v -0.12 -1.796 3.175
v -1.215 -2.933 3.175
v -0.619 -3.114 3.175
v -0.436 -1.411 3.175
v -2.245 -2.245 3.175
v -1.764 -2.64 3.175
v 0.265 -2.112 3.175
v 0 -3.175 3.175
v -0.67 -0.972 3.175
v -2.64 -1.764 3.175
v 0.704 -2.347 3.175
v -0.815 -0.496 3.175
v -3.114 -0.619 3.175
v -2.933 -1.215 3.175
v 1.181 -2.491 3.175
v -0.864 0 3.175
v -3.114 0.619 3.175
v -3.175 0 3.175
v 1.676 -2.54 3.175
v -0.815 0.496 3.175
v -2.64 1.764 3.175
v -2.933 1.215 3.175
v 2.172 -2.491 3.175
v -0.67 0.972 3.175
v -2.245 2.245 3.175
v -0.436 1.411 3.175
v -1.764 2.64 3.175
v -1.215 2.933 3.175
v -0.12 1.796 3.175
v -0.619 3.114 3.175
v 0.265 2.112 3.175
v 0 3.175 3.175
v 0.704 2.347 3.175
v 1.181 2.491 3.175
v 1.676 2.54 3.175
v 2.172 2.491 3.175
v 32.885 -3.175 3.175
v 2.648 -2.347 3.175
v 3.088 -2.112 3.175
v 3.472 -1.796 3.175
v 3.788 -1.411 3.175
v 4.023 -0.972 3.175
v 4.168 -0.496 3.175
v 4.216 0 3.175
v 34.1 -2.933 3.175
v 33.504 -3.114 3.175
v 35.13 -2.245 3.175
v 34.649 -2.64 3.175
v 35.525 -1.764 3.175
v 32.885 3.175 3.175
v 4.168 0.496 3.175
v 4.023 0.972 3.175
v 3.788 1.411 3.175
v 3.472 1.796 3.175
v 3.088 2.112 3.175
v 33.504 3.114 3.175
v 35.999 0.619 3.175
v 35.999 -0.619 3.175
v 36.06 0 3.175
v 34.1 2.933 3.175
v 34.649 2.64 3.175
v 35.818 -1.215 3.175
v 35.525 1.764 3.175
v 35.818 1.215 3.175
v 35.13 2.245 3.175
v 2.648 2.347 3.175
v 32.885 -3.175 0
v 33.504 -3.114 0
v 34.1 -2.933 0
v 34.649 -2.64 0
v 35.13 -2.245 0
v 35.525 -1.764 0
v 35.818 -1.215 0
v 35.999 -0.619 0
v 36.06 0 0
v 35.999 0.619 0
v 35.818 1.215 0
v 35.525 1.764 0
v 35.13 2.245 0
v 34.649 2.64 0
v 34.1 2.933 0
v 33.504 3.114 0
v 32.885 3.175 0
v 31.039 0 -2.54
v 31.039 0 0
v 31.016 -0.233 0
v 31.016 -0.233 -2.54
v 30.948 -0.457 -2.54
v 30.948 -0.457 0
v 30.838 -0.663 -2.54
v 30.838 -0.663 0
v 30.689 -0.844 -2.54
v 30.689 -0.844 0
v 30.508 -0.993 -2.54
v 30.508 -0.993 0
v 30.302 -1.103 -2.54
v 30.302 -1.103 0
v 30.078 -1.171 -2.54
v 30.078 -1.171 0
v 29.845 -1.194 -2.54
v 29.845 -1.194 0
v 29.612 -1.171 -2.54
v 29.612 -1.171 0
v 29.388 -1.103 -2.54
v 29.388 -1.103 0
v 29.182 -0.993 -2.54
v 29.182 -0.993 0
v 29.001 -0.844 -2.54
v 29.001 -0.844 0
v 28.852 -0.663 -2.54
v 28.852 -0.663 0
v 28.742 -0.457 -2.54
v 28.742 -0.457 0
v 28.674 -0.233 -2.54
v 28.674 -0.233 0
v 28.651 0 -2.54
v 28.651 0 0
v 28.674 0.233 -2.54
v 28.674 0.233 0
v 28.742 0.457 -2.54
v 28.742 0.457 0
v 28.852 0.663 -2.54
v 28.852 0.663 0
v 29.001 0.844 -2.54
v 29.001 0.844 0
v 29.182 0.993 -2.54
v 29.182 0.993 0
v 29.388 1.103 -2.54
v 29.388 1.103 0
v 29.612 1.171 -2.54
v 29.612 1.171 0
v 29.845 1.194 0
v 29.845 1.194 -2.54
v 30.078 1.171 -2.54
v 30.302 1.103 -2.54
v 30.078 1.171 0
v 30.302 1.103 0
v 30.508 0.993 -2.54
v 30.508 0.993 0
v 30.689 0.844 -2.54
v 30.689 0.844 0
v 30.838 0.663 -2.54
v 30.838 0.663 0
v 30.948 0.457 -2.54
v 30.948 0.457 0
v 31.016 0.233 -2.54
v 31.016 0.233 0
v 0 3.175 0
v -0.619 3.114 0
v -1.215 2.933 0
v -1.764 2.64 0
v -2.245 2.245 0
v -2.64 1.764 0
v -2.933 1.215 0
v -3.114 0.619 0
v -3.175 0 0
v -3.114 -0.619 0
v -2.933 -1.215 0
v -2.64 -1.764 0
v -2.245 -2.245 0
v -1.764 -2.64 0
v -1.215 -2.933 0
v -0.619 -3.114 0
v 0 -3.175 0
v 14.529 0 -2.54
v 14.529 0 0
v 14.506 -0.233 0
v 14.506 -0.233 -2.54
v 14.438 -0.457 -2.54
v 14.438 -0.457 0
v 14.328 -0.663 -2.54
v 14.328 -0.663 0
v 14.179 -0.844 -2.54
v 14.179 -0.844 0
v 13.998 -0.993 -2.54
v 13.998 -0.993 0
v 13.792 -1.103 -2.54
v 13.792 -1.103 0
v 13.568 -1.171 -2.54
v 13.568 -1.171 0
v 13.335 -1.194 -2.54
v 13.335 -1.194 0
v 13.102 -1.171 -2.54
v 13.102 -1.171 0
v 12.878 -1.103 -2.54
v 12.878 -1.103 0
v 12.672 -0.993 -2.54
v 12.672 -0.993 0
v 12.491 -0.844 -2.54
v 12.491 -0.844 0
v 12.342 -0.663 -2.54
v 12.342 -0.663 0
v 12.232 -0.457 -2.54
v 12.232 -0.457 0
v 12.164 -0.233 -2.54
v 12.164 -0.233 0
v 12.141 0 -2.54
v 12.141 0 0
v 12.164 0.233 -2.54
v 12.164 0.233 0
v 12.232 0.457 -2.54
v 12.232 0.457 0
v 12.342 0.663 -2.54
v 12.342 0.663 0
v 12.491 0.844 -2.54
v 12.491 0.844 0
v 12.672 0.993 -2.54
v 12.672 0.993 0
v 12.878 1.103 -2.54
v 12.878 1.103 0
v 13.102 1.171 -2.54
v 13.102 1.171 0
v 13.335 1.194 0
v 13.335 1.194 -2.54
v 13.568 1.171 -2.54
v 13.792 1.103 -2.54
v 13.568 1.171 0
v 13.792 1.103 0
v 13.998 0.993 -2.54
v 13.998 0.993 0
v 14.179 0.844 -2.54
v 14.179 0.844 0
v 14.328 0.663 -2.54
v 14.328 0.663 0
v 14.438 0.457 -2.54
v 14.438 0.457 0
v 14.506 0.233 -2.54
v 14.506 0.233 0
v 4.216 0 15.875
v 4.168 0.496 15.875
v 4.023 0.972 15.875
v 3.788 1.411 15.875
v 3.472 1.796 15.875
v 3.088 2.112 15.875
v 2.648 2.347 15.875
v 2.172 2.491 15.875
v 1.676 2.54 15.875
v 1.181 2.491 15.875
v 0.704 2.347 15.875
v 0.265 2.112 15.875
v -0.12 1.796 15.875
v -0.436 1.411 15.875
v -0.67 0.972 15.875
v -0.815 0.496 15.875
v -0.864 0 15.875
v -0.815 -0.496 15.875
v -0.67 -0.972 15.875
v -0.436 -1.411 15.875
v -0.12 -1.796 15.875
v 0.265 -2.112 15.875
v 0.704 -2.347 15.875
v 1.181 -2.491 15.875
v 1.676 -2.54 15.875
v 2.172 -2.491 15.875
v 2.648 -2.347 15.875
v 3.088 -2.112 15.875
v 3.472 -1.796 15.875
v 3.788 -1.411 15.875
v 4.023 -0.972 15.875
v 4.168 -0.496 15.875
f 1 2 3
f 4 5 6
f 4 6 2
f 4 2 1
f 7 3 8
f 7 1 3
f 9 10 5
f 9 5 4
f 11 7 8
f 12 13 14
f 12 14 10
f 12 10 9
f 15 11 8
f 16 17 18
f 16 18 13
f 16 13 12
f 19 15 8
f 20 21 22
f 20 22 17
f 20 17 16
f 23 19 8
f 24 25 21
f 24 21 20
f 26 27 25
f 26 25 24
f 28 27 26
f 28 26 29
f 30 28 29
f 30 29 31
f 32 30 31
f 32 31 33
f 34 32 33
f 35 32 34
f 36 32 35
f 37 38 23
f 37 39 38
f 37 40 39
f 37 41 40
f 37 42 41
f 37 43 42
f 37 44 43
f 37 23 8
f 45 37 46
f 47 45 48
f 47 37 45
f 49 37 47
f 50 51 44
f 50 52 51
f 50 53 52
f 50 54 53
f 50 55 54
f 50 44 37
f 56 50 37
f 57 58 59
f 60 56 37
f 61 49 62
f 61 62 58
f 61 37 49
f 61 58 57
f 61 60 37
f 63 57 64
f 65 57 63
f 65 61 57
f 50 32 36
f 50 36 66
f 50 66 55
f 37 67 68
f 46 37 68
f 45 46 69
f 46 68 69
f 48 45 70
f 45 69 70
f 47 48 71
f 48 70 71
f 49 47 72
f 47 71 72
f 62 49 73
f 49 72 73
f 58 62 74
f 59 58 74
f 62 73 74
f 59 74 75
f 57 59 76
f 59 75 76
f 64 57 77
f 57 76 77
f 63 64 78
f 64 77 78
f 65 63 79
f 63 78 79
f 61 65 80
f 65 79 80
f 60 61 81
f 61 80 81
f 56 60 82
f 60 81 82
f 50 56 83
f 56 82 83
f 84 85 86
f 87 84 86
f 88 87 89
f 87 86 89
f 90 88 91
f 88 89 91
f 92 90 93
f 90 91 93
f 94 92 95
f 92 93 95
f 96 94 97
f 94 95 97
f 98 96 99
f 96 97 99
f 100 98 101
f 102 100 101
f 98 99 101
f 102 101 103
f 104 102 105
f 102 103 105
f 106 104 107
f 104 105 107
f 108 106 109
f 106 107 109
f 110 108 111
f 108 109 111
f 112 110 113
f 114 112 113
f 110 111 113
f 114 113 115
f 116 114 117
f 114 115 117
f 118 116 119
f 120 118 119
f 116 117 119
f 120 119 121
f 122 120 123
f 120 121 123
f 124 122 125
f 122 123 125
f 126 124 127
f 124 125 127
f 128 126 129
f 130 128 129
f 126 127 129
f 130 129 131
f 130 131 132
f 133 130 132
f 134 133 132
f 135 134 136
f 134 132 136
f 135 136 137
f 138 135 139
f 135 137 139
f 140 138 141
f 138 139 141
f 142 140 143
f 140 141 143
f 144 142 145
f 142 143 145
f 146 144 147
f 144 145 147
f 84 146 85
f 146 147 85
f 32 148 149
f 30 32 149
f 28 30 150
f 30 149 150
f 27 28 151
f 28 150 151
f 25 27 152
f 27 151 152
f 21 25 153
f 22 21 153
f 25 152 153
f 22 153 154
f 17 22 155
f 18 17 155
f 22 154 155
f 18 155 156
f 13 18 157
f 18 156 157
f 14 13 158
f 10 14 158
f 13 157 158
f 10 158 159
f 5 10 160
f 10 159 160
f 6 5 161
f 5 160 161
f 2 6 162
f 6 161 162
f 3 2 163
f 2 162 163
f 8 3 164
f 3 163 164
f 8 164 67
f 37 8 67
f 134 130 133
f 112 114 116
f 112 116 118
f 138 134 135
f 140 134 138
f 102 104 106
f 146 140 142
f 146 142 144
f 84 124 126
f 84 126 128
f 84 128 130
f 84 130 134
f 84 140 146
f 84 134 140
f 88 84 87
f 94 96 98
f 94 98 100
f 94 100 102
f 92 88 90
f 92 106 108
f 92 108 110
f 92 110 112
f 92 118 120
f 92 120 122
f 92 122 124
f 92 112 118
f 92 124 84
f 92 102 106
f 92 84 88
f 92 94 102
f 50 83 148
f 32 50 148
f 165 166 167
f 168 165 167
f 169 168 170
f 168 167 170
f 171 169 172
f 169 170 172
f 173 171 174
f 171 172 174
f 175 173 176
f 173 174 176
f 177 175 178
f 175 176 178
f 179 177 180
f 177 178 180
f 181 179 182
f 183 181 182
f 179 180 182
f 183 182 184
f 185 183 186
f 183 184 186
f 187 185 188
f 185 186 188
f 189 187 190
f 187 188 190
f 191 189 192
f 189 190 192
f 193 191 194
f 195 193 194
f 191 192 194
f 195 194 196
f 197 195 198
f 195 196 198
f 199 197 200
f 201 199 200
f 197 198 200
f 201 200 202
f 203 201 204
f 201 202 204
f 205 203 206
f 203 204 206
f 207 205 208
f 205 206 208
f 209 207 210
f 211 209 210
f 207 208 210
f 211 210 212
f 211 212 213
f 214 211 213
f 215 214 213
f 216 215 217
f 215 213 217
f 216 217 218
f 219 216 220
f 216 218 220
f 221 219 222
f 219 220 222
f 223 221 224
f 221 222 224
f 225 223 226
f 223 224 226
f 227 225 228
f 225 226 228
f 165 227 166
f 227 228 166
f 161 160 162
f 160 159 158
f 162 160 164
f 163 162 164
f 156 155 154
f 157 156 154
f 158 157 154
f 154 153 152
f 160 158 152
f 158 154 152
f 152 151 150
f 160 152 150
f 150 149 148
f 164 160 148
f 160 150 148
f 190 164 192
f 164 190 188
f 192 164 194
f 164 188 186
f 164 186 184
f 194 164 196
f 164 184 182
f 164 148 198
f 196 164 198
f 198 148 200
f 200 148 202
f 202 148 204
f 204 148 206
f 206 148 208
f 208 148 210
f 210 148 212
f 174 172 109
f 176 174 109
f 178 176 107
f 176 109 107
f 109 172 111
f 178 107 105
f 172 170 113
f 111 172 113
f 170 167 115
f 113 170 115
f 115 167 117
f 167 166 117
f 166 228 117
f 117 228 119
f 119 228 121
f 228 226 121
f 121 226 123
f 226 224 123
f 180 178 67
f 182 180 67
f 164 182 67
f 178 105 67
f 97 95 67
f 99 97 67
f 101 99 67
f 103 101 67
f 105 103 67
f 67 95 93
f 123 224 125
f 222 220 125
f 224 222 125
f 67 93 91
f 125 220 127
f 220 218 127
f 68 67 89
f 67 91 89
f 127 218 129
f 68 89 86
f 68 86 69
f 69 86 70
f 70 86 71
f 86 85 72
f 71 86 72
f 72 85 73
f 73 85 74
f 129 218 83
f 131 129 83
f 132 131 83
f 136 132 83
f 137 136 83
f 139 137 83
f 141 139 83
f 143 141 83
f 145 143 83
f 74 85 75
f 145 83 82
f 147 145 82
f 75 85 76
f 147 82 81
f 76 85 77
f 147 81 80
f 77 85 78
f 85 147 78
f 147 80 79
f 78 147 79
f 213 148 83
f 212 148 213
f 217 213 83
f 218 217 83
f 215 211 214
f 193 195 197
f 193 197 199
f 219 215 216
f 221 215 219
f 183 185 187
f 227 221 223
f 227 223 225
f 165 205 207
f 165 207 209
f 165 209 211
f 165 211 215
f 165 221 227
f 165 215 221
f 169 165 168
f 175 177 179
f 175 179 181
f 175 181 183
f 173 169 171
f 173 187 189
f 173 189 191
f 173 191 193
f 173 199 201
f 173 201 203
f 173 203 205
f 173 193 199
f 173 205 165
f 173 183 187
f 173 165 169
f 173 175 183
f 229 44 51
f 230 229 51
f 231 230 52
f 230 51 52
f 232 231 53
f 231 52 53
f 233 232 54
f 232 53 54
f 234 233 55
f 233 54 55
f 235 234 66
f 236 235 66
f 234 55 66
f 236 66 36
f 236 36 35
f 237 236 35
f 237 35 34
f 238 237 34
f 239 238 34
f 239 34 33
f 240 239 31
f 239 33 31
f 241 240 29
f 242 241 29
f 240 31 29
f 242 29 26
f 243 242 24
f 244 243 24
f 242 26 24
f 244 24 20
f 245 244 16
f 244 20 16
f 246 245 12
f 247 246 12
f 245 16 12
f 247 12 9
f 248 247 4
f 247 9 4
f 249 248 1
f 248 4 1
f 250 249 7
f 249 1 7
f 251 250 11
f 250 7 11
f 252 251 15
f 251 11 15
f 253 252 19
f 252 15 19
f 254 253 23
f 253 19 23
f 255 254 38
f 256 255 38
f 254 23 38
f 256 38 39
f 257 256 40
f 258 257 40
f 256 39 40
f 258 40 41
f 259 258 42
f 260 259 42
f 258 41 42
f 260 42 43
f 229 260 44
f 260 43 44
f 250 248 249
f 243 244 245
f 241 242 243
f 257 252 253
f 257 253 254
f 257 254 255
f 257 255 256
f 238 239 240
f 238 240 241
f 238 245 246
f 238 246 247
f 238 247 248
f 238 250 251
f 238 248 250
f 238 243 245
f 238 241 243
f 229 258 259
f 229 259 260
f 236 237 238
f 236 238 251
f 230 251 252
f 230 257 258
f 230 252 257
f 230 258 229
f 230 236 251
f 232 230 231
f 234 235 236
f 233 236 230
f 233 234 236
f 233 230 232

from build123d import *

# Parameters (mm, degrees)
F1_DEPTH = 3.175
F2_R     = 2.54
F3_DEPTH = 12.7
F4_R     = 1.1938
F5_DEPTH = 2.54


with BuildPart() as f1:
    # F0 (on Top) → F1 (new body)
    with BuildSketch(Plane.XY):
        with BuildLine():
            Line((32.885008, 3.175), (0, 3.175))
            ThreePointArc((0, 3.175), (-3.175, 0), (0, -3.175))
            Line((0, -3.175), (32.885008, -3.175))
            ThreePointArc((32.885008, -3.175), (36.060008, 0), (32.885008, 3.175))
        make_face()
    extrude(amount=F1_DEPTH)

    # F2 (on face) → F3 (join)
    with BuildSketch(Plane.XY.offset(3.175)):
        with Locations((1.6764, 0)):
            Circle(F2_R)
    extrude(amount=F3_DEPTH)

    # F4 (on face) → F5 (join)
    with BuildSketch(Plane(origin=(0, 0, 0), x_dir=(1, 0, 0), z_dir=(0, 0, -1))):
        with Locations((13.335, 0)):
            Circle(F4_R)
        with Locations((29.845, 0)):
            Circle(F4_R)
    extrude(amount=F5_DEPTH)


solid = f1.part
